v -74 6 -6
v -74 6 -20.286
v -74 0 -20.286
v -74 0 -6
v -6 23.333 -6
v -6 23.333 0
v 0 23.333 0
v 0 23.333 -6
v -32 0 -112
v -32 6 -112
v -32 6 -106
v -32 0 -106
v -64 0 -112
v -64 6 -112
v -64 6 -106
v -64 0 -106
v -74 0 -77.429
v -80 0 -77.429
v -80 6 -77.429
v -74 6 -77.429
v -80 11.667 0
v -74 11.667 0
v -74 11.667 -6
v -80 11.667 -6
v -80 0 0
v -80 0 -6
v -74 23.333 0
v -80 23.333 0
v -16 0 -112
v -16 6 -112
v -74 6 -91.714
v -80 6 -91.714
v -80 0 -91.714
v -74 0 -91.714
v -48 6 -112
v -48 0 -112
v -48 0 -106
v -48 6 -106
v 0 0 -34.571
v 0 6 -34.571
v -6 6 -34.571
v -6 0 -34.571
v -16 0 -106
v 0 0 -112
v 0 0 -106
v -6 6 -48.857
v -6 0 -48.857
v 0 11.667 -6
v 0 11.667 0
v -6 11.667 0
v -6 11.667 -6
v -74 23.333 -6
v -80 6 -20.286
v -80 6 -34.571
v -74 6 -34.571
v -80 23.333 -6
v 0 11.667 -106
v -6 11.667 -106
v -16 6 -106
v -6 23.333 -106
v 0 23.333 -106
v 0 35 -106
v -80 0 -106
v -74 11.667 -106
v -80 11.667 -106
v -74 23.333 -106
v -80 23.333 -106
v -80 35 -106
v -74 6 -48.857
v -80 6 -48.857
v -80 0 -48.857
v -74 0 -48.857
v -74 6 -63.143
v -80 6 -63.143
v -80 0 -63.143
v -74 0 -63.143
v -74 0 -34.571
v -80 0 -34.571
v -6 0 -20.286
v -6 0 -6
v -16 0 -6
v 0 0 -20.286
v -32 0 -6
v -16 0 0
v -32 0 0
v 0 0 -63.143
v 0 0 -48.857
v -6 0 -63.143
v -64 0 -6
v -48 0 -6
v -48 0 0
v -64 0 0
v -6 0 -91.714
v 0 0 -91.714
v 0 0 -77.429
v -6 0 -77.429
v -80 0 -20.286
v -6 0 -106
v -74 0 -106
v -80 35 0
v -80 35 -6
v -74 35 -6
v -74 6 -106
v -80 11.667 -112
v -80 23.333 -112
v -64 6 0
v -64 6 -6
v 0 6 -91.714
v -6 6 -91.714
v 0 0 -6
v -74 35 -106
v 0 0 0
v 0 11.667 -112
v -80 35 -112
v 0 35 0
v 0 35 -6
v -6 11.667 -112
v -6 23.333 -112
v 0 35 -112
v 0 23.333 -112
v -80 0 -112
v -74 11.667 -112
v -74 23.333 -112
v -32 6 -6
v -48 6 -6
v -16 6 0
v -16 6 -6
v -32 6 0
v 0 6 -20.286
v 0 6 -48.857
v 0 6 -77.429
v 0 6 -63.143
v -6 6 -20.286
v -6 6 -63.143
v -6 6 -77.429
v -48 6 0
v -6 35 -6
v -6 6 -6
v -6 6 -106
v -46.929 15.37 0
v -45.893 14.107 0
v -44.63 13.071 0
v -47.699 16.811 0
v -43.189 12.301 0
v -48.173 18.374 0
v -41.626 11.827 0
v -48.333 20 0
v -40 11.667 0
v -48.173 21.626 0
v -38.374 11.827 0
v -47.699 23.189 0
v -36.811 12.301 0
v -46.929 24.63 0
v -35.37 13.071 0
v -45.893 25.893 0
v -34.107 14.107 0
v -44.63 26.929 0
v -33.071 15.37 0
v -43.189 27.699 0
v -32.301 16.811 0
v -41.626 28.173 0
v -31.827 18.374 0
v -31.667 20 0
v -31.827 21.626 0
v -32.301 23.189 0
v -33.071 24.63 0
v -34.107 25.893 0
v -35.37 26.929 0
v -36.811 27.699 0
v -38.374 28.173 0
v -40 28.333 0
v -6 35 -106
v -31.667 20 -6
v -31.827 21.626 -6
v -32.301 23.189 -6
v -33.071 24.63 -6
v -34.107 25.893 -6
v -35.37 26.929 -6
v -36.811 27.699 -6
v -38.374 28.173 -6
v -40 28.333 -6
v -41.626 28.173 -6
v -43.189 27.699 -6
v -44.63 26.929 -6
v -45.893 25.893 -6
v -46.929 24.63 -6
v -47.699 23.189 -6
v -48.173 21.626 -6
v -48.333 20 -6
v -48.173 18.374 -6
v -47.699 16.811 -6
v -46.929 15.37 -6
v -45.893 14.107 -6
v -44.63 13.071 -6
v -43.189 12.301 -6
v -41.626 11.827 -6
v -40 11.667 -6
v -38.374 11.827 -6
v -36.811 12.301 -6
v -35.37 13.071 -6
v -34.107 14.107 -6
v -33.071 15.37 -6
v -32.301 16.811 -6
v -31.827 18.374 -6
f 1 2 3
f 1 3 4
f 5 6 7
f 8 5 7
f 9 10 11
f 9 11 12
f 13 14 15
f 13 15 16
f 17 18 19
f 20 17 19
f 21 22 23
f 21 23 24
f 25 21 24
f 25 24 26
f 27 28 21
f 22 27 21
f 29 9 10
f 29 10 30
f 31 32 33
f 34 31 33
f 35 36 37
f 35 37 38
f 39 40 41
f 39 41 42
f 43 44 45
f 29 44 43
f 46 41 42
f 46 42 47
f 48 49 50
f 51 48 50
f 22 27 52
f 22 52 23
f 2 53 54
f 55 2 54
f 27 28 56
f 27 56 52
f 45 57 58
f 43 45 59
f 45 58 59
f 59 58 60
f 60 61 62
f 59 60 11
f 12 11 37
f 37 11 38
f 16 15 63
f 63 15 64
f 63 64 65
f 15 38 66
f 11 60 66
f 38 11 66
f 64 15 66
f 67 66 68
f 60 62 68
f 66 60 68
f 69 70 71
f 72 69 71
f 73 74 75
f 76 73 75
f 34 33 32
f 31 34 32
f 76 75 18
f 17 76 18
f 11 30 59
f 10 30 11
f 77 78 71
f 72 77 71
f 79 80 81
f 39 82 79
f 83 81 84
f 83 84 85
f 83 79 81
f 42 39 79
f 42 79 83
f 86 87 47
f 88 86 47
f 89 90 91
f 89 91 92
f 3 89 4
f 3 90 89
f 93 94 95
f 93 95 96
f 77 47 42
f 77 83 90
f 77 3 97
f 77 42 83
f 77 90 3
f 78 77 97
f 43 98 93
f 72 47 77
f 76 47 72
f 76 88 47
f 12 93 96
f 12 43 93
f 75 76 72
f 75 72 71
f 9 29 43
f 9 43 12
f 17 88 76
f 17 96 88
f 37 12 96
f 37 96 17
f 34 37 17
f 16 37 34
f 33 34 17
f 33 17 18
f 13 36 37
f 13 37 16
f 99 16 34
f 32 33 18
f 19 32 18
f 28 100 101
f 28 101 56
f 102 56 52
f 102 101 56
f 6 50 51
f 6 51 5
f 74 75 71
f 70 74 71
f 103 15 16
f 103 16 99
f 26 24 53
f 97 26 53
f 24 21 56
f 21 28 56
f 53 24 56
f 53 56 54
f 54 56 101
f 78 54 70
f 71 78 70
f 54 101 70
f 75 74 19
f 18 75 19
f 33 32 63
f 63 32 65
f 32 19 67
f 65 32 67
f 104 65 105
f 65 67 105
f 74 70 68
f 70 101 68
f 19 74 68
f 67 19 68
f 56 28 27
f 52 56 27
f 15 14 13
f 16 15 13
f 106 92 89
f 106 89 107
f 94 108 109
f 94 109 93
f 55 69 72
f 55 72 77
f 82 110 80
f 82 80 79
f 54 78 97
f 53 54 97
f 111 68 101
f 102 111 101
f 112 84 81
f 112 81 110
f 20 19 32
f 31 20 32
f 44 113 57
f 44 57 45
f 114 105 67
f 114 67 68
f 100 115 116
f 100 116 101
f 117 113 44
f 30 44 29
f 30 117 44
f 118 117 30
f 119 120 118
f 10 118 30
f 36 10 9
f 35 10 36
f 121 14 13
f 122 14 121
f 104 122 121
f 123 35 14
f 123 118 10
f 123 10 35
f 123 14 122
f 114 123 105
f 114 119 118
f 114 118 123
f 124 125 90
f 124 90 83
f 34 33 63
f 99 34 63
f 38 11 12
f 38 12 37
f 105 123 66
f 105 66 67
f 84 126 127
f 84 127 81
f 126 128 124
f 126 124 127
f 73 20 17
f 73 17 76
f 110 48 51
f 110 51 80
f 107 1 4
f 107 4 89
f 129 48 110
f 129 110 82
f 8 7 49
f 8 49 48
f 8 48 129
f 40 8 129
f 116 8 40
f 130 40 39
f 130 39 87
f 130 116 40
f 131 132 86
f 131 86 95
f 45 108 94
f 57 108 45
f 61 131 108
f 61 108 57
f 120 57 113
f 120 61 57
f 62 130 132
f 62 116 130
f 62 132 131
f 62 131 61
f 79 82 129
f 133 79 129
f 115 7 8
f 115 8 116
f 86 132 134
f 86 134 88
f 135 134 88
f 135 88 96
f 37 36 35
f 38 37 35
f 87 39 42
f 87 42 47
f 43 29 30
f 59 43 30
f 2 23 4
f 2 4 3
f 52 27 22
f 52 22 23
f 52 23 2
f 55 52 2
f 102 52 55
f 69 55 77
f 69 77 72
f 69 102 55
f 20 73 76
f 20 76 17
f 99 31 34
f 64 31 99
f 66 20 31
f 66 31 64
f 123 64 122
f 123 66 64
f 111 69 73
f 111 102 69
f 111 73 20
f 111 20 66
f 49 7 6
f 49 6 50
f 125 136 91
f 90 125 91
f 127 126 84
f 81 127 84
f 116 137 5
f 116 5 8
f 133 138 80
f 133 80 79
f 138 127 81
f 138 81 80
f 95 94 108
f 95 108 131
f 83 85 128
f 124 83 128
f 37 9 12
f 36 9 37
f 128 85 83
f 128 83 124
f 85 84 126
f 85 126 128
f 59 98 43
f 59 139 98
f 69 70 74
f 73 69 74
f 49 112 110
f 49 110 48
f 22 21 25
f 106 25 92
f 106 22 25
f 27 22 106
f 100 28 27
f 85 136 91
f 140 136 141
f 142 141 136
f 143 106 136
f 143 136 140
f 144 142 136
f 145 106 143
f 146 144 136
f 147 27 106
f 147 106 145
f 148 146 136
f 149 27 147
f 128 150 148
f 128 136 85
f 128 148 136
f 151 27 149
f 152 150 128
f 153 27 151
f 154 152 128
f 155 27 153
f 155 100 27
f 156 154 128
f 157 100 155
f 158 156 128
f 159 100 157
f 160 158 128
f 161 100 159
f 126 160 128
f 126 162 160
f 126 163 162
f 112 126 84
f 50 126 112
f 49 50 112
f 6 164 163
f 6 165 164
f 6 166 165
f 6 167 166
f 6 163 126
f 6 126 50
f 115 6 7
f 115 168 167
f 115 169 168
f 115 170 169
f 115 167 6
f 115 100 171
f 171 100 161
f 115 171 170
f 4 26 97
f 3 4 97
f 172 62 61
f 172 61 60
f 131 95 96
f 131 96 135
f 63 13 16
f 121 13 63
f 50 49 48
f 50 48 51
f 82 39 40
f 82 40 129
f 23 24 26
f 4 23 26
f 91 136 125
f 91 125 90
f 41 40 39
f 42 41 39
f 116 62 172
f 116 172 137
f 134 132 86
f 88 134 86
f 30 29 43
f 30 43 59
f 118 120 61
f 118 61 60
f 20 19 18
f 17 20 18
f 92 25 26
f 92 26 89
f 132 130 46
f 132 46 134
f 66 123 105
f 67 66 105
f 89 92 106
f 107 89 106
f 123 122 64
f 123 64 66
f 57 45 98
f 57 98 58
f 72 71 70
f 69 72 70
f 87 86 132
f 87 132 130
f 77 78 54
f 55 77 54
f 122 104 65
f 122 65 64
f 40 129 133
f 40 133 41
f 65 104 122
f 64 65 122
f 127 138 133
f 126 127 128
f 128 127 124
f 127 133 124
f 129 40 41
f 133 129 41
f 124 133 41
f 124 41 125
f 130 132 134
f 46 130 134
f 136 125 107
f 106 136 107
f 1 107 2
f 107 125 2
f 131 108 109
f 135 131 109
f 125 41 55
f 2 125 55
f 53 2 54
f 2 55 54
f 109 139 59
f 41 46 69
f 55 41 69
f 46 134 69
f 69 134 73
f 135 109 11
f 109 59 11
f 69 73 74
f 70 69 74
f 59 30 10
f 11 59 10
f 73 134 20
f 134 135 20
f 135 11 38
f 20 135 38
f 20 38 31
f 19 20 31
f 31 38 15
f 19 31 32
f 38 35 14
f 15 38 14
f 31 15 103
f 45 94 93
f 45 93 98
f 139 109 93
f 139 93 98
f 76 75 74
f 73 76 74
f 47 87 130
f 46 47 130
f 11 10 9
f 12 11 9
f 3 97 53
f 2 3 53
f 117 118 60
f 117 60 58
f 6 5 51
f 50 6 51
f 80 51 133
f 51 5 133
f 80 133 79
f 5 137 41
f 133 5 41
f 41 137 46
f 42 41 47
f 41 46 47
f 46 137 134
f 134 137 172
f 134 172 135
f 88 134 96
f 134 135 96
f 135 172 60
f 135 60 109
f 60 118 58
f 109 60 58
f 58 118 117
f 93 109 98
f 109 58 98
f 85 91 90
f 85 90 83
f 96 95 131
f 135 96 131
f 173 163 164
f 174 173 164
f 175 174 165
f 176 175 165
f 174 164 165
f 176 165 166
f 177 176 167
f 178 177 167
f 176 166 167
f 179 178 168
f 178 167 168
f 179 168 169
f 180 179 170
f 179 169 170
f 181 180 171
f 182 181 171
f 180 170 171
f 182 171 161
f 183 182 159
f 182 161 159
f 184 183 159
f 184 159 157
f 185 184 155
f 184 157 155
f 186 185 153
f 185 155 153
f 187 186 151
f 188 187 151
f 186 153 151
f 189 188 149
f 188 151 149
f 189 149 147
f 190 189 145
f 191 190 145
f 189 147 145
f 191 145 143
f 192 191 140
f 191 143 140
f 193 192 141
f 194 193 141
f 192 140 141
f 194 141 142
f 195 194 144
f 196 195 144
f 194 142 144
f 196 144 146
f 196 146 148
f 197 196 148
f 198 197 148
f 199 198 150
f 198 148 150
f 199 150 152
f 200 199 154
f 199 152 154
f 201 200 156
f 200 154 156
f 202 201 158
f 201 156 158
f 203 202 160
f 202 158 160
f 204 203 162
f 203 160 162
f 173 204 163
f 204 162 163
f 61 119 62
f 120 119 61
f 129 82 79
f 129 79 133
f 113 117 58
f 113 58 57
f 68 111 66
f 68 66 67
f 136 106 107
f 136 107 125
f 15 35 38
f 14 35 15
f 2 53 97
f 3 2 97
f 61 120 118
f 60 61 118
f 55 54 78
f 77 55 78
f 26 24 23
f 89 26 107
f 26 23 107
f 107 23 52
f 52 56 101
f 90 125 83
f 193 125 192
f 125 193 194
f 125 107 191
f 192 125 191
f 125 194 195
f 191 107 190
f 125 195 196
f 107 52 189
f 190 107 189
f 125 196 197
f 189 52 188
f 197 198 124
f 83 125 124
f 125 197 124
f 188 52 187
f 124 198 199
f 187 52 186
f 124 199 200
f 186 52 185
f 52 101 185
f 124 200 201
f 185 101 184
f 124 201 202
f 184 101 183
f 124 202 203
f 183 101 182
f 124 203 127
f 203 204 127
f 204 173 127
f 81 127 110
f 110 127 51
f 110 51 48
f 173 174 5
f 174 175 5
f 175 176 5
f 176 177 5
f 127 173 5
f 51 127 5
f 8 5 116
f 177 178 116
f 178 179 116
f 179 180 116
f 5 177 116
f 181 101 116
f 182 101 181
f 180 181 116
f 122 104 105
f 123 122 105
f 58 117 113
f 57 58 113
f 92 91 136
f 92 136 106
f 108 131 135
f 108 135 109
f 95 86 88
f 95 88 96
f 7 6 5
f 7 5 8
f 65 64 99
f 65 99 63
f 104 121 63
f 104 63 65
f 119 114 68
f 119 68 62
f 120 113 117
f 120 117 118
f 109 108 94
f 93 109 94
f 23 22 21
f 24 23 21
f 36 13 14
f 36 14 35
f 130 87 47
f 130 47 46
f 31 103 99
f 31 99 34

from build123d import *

# Parameters (mm, degrees)
BOSS_EXTRUDE1_DEPTH = 6
SKETCH2_R           = 8.333333333
BOSS_EXTRUDE2_DEPTH = 6
BOSS_EXTRUDE3_DEPTH = 6
BOSS_EXTRUDE6_DEPTH = 6
BOSS_EXTRUDE8_DEPTH = 6
CUT_EXTRUDE8_DEPTH  = 6
CUT_EXTRUDE9_DEPTH  = 6
CUT_EXTRUDE10_DEPTH = 6
CUT_EXTRUDE11_DEPTH = 6


with BuildPart() as part:
    # Sketch1 → Boss-Extrude1 (new body)
    with BuildSketch(Plane(origin=(0, 0, 0), x_dir=(1, 0, 0), z_dir=(0, 1, 0))):
        Polygon((-80, 112), (0, 112), (0, 0), (-80, 0), (-80, 6), (-80, 24.8), (-80, 43.6), (-80, 62.4), (-80, 81.2), (-80, 100), align=None)
    extrude(amount=BOSS_EXTRUDE1_DEPTH)


with BuildPart() as body_2:
    # Sketch2 → Boss-Extrude2 (new body)
    with BuildSketch(Plane.XY):
        Polygon((-80, 0), (-64, 0), (-64, 6), (-48, 6), (-48, 0), (-32, 0), (-32, 6), (-16, 6), (-16, 0), (0, 0), (0, 11.666666667), (-6, 11.666666667), (-6, 23.333333333), (0, 23.333333333), (0, 35), (-80, 35), (-80, 23.333333333), (-74, 23.333333333), (-74, 11.666666667), (-80, 11.666666667), align=None)
        with Locations((-40, 20)):
            Circle(SKETCH2_R, mode=Mode.SUBTRACT)
    extrude(amount=-BOSS_EXTRUDE2_DEPTH)


with BuildPart() as body_3:
    # Sketch3 → Boss-Extrude3 (new body)
    with BuildSketch(Plane.ZY.offset(80)):
        Polygon((0, 6), (-6, 6), (-6, 0), (-20.285714286, 0), (-20.285714286, 6), (-34.571428571, 6), (-34.571428571, 0), (-48.857142857, 0), (-48.857142857, 6), (-63.142857143, 6), (-63.142857143, 0), (-77.428571429, 0), (-77.428571429, 6), (-91.714285714, 6), (-91.714285714, 0), (-106, 0), (-106, 6), (-112, 6), (-112, 35), (0, 35), align=None)
    extrude(amount=-BOSS_EXTRUDE3_DEPTH)


with BuildPart() as body_4:
    # Sketch9 → Boss-Extrude6 (new body)
    with BuildSketch(Plane(origin=(0, 0, -112), x_dir=(-1, 0, 0), z_dir=(0, 0, -1))):
        Polygon((80, 0), (80, 11.666666667), (74, 11.666666667), (74, 23.333333333), (80, 23.333333333), (80, 35), (0, 35), (0, 23.333333333), (6, 23.333333333), (6, 11.666666667), (0, 11.666666667), (0, 0), (16, 0), (16, 6), (32, 6), (32, 0), (48, 0), (48, 6), (64, 6), (64, 0), align=None)
    extrude(amount=-BOSS_EXTRUDE6_DEPTH)


with BuildPart() as body_5:
    # Sketch17 → Boss-Extrude8 (new body)
    with BuildSketch(Plane(origin=(0, 0, 0), x_dir=(0, 0, -1), z_dir=(1, 0, 0))):
        Polygon((112, 6), (112, 35), (0, 35), (0, 6), (6, 6), (6, 0), (20.285714286, 0), (20.285714286, 6), (34.571428571, 6), (34.571428571, 0), (48.857142857, 0), (48.857142857, 6), (63.142857143, 6), (63.142857143, 0), (77.428571429, 0), (77.428571429, 6), (91.714285714, 6), (91.714285714, 0), (106, 0), (106, 6), align=None)
    extrude(amount=-BOSS_EXTRUDE8_DEPTH)


with BuildPart() as cut_extrude8_tool:
    # Sketch18 → Cut-Extrude8 (new body)
    with BuildSketch(Plane.XY):
        Polygon((-80, 11.666666667), (-80, 0), (-64, 0), (-64, 6), (-48, 6), (-48, 0), (-32, 0), (-32, 6), (-16, 6), (-16, 0), (0, 0), (0, 11.666666667), (-6, 11.666666667), (-6, 23.333333333), (0, 23.333333333), (0, 35), (-80, 35), (-80, 23.333333333), (-74, 23.333333333), (-74, 11.666666667), align=None)
    extrude(amount=-CUT_EXTRUDE8_DEPTH)


with BuildPart() as body_5_1:
    add(body_5.part)

    # Cut-Extrude8: cut by cut_extrude8_tool
    add(cut_extrude8_tool.part, mode=Mode.SUBTRACT)


with BuildPart() as part_1:
    add(part.part)

    # Cut-Extrude8: cut by cut_extrude8_tool
    add(cut_extrude8_tool.part, mode=Mode.SUBTRACT)


with BuildPart() as body_3_1:
    add(body_3.part)

    # Cut-Extrude8: cut by cut_extrude8_tool
    add(cut_extrude8_tool.part, mode=Mode.SUBTRACT)


with BuildPart() as cut_extrude9_tool:
    # Sketch19 → Cut-Extrude9 (new body)
    with BuildSketch(Plane(origin=(0, 0, -112), x_dir=(-1, 0, 0), z_dir=(0, 0, -1))):
        Polygon((64, 0), (80, 0), (80, 11.666666667), (74, 11.666666667), (74, 23.333333333), (80, 23.333333333), (80, 35), (0, 35), (0, 23.333333333), (6, 23.333333333), (6, 11.666666667), (0, 11.666666667), (0, 0), (16, 0), (16, 6), (32, 6), (32, 0), (48, 0), (48, 6), (64, 6), align=None)
    extrude(amount=-CUT_EXTRUDE9_DEPTH)


with BuildPart() as part_2:
    add(part_1.part)

    # Cut-Extrude9: cut by cut_extrude9_tool
    add(cut_extrude9_tool.part, mode=Mode.SUBTRACT)

    # Sketch20 → Cut-Extrude10 (cut)
    with BuildSketch(Plane(origin=(0, 0, 0), x_dir=(0, 0, -1), z_dir=(1, 0, 0))):
        Polygon((106, 11.666666667), (112, 11.666666667), (112, 23.333333333), (106, 23.333333333), (106, 35), (6, 35), (6, 23.333333333), (0, 23.333333333), (0, 11.666666667), (6, 11.666666667), (6, 0), (20.285714286, 0), (20.285714286, 6), (34.571428571, 6), (34.571428571, 0), (48.857142857, 0), (48.857142857, 6), (63.142857143, 6), (63.142857143, 0), (77.428571429, 0), (77.428571429, 6), (91.714285714, 6), (91.714285714, 0), (106, 0), align=None)
    extrude(amount=-CUT_EXTRUDE10_DEPTH, mode=Mode.SUBTRACT)

    # Sketch21 → Cut-Extrude11 (cut)
    with BuildSketch(Plane.ZY.offset(80)):
        Polygon((-112, 23.333333333), (-112, 11.666666667), (-106, 11.666666667), (-106, 0), (-91.714285714, 0), (-91.714285714, 6), (-77.428571429, 6), (-77.428571429, 0), (-63.142857143, 0), (-63.142857143, 6), (-48.857142857, 6), (-48.857142857, 0), (-34.571428571, 0), (-34.571428571, 6), (-20.285714286, 6), (-20.285714286, 0), (-6, 0), (-6, 11.666666667), (0, 11.666666667), (0, 23.333333333), (-6, 23.333333333), (-6, 35), (-106, 35), (-106, 23.333333333), align=None)
    extrude(amount=-CUT_EXTRUDE11_DEPTH, mode=Mode.SUBTRACT)


with BuildPart() as body_5_2:
    add(body_5_1.part)

    # Cut-Extrude9: cut by cut_extrude9_tool
    add(cut_extrude9_tool.part, mode=Mode.SUBTRACT)


with BuildPart() as body_3_2:
    add(body_3_1.part)

    # Cut-Extrude9: cut by cut_extrude9_tool
    add(cut_extrude9_tool.part, mode=Mode.SUBTRACT)


solid = Compound([body_2.part, body_4.part, part_2.part, body_5_2.part, body_3_2.part])
